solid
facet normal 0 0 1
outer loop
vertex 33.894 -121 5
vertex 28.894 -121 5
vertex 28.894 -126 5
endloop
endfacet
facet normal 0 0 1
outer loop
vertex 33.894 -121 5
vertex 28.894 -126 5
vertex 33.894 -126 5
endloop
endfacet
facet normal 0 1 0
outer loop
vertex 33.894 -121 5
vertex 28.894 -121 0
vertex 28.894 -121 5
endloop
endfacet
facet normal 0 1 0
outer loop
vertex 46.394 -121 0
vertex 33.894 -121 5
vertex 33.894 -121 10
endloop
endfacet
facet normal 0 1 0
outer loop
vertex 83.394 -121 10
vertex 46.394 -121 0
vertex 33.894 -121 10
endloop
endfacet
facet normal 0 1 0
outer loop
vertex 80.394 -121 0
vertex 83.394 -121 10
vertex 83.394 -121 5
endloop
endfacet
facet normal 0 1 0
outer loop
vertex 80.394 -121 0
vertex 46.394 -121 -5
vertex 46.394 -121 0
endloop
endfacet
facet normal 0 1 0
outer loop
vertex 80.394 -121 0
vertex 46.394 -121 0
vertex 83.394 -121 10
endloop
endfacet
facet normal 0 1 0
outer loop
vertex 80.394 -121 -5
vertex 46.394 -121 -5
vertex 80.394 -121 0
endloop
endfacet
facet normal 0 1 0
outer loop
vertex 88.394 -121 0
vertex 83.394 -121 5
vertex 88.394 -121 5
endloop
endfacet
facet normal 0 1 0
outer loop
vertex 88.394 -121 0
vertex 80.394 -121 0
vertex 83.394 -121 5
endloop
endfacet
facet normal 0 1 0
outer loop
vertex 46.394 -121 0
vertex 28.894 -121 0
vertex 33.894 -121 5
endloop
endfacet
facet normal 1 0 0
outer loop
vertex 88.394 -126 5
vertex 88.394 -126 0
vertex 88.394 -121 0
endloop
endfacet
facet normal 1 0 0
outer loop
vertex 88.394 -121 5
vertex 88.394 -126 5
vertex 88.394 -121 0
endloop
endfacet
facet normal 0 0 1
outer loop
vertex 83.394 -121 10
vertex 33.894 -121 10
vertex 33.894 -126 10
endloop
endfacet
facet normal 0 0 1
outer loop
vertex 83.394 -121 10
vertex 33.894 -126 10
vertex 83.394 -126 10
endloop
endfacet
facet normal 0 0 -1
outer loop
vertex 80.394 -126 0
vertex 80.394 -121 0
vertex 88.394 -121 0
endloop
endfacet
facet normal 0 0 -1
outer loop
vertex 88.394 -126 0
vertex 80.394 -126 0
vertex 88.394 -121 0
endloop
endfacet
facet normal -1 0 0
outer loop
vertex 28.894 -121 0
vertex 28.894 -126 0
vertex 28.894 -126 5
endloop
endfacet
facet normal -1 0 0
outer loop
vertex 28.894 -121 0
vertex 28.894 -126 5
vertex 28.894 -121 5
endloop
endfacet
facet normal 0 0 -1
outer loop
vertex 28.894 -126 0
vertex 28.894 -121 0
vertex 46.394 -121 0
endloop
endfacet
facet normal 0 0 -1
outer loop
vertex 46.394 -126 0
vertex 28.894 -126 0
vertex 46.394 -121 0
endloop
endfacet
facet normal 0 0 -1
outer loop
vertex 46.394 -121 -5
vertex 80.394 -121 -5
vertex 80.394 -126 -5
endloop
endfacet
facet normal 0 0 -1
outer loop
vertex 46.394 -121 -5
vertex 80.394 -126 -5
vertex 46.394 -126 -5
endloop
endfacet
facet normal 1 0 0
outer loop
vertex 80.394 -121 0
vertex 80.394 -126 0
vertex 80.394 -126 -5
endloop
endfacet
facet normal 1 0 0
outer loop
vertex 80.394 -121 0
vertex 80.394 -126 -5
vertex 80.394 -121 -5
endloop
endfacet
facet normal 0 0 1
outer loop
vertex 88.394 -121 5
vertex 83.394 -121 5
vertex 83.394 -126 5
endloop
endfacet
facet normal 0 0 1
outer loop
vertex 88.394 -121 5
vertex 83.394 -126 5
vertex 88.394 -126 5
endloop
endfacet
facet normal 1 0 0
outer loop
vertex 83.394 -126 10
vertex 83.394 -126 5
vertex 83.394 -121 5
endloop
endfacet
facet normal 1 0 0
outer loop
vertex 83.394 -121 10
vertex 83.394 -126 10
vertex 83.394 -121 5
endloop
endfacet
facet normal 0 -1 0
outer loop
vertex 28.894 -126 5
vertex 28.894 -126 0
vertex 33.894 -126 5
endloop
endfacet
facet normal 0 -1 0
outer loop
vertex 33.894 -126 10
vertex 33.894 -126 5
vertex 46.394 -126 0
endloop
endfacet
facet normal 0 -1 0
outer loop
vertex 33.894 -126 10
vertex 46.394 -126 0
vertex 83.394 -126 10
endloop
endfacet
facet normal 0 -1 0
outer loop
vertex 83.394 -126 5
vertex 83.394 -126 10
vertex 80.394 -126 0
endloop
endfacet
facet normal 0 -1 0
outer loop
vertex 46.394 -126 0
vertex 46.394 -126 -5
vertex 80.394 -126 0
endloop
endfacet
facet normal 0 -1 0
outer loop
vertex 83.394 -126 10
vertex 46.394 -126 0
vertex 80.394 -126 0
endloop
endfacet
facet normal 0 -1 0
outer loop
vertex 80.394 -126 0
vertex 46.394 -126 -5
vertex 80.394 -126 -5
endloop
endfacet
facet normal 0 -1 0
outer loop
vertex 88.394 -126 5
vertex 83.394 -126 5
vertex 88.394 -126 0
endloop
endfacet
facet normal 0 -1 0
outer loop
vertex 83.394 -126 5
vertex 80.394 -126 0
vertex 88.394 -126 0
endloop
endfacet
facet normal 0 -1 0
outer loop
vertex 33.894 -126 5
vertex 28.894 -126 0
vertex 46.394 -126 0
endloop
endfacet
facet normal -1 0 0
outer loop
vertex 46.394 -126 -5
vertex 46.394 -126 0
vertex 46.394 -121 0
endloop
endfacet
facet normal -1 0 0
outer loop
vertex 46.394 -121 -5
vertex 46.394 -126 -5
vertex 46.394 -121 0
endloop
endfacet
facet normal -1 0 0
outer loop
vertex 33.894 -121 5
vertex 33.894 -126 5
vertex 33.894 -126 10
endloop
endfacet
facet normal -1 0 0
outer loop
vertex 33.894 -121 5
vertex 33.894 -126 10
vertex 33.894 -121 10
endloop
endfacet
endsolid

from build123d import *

# Parameters (mm, degrees)
SKETCH1_W           = 59.5
SKETCH1_H           = 5
BOSS_EXTRUDE1_DEPTH = 5
SKETCH2_W           = 49.5
SKETCH2_H           = 5
BOSS_EXTRUDE2_DEPTH = 5
SKETCH3_W           = 34
SKETCH3_H           = 5
BOSS_EXTRUDE3_DEPTH = 5


with BuildPart() as part:
    # Sketch1 → Boss-Extrude1 (new body)
    with BuildSketch(Plane.XY):
        with Locations((58.644042166, -123.5)):
            Rectangle(SKETCH1_W, SKETCH1_H)
    extrude(amount=BOSS_EXTRUDE1_DEPTH)

    # Sketch2 → Boss-Extrude2 (add)
    with BuildSketch(Plane.XY.offset(5)):
        with Locations((58.644042166, -123.5)):
            Rectangle(SKETCH2_W, SKETCH2_H)
    extrude(amount=BOSS_EXTRUDE2_DEPTH)

    # Sketch3 → Boss-Extrude3 (add)
    with BuildSketch(Plane(origin=(0, 0, 0), x_dir=(-1, 0, 0), z_dir=(0, 0, -1))):
        with Locations((-63.394042166, -123.5)):
            Rectangle(SKETCH3_W, SKETCH3_H)
    extrude(amount=BOSS_EXTRUDE3_DEPTH)


solid = part.part
